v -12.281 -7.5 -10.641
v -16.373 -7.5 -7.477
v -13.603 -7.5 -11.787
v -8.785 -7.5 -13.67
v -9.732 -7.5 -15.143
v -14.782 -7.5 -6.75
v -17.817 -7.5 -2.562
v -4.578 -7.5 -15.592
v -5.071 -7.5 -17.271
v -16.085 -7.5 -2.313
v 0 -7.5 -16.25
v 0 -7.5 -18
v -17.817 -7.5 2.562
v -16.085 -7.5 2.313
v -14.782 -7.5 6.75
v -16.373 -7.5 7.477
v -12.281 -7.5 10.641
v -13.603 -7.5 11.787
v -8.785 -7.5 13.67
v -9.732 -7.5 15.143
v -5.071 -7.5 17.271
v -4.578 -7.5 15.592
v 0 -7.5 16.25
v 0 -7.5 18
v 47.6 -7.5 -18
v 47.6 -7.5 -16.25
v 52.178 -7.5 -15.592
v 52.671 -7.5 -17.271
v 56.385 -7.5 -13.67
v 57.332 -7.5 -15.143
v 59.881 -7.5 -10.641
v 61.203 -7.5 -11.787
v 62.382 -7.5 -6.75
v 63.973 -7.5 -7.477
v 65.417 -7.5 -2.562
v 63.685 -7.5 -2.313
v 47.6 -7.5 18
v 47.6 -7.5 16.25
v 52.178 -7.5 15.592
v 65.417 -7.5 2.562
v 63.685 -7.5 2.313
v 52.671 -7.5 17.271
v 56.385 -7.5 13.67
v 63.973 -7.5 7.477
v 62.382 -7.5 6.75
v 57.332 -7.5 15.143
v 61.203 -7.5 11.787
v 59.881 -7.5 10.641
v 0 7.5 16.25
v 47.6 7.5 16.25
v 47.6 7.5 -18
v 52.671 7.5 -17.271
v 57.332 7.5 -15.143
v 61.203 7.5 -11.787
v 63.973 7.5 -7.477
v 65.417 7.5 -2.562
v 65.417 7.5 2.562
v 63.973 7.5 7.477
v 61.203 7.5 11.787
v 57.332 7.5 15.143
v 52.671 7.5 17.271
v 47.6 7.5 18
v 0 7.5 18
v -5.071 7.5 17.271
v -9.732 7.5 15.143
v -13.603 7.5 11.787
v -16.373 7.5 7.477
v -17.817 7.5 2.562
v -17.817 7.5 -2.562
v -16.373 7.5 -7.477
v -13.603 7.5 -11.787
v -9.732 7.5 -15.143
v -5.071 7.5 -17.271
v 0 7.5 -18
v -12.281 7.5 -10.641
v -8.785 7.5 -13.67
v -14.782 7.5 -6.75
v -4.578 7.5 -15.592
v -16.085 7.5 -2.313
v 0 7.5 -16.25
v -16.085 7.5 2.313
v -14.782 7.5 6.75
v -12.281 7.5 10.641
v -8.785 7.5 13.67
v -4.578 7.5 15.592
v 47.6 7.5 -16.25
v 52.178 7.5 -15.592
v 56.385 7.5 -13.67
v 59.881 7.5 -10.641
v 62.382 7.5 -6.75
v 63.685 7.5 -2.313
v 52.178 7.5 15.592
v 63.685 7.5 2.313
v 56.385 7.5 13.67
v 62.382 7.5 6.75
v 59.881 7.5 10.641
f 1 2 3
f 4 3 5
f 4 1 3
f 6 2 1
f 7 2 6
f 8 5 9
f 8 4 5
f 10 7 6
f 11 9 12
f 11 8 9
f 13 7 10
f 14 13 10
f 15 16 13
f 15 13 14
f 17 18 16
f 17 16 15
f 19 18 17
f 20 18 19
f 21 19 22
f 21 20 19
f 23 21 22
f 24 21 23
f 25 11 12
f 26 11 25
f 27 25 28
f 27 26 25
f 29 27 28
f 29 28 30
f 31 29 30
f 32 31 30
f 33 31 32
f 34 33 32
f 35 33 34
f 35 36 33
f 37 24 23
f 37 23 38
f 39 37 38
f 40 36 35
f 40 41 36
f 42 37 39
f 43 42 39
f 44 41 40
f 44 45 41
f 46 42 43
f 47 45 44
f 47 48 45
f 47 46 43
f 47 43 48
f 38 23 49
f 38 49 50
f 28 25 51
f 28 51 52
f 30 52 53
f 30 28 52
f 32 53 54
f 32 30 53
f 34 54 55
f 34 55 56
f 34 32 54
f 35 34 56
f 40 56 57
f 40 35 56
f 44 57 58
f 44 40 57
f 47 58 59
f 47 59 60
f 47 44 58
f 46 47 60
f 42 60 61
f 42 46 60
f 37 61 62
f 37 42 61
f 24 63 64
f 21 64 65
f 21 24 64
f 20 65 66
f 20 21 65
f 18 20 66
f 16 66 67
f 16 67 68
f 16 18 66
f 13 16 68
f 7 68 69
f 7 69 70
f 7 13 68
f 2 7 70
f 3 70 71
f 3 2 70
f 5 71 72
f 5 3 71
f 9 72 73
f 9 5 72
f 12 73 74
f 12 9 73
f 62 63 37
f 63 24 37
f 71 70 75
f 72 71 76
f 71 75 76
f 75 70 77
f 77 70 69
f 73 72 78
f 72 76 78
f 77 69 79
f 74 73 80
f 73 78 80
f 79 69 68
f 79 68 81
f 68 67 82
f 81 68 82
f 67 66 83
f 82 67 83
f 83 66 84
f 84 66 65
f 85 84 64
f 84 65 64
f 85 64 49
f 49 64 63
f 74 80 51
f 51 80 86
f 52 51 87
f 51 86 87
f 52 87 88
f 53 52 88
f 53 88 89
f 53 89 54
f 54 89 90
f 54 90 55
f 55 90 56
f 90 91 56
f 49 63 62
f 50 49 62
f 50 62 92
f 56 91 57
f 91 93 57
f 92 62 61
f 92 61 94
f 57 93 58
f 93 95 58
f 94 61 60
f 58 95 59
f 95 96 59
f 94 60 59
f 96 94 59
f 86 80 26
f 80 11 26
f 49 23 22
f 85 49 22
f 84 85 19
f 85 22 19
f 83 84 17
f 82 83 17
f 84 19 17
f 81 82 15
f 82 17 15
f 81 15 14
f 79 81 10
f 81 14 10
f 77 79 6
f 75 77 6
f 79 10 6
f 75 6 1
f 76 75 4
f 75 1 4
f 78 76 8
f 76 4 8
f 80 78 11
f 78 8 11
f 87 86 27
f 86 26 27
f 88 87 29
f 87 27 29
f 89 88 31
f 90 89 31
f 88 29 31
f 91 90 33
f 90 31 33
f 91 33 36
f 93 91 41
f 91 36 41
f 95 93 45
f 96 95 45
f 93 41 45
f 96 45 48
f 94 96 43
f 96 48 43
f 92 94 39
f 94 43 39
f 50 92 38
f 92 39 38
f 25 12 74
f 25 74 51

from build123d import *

# Parameters (mm, degrees)
PAD_DEPTH = 7.5


with BuildPart() as part:
    # Sketch → Pad (new body, symmetric)
    with BuildSketch(Plane.XZ):
        with BuildLine():
            ThreePointArc((0, 18), (-18, 0), (0, -18))
            Line((0, -18), (47.6, -18))
            ThreePointArc((47.6, -18), (65.6, 0), (47.6, 18))
            Line((0, 18), (47.6, 18))
        make_face()
        with BuildLine():
            ThreePointArc((0, 16.25), (-16.25, 0), (0, -16.25))
            Line((0, -16.25), (47.6, -16.25))
            ThreePointArc((47.6, -16.25), (63.85, 0), (47.6, 16.25))
            Line((0, 16.25), (47.6, 16.25))
        make_face(mode=Mode.SUBTRACT)
    extrude(amount=PAD_DEPTH, both=True)


solid = part.part
